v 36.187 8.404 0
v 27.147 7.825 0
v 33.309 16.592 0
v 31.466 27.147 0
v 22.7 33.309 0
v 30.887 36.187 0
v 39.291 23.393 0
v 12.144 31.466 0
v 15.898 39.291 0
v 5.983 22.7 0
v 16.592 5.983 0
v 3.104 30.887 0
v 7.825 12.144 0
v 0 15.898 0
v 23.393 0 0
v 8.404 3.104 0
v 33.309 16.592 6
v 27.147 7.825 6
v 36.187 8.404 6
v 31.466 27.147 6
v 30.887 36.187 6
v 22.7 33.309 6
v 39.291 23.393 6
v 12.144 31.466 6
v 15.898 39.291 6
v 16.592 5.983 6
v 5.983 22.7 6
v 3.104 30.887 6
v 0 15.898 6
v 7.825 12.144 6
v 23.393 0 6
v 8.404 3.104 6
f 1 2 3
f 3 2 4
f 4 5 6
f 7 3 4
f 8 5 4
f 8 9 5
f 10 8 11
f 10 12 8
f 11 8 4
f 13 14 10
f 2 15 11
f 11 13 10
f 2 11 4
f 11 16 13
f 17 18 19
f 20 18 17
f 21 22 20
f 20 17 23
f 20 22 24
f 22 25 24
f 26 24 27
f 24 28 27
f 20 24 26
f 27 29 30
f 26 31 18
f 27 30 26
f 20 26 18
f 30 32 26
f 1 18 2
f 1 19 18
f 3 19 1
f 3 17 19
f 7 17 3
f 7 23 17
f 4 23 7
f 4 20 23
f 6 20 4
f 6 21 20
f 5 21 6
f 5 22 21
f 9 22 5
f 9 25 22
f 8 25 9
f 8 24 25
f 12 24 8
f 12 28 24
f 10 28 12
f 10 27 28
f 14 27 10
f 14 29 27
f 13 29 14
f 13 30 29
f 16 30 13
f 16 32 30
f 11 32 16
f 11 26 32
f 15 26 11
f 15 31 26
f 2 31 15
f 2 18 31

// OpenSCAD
$fn = 32;

// ----------------------------------------------------------------------
// Chain sprocket: 8 teeth, 14 mm root radius
// ----------------------------------------------------------------------

// --- parameters (mm) ---
profile_height = 6;       // extrusion height
profile_points = 16;      // points of the closed outline

profile = [[33.309, 16.592], [39.291, 23.393], [31.466, 27.147], [30.887, 36.187], [22.7, 33.309], [15.898, 39.291], [12.144, 31.466], [3.104, 30.887], [5.983, 22.7], [0, 15.898], [7.825, 12.144], [8.404, 3.104], [16.592, 5.983], [23.393, 0], [27.147, 7.825], [36.187, 8.404]];  // single closed polygon, 16 points, counter clockwise

// --- the one profile operation ---
linear_extrude(height = profile_height) polygon(points = profile);
